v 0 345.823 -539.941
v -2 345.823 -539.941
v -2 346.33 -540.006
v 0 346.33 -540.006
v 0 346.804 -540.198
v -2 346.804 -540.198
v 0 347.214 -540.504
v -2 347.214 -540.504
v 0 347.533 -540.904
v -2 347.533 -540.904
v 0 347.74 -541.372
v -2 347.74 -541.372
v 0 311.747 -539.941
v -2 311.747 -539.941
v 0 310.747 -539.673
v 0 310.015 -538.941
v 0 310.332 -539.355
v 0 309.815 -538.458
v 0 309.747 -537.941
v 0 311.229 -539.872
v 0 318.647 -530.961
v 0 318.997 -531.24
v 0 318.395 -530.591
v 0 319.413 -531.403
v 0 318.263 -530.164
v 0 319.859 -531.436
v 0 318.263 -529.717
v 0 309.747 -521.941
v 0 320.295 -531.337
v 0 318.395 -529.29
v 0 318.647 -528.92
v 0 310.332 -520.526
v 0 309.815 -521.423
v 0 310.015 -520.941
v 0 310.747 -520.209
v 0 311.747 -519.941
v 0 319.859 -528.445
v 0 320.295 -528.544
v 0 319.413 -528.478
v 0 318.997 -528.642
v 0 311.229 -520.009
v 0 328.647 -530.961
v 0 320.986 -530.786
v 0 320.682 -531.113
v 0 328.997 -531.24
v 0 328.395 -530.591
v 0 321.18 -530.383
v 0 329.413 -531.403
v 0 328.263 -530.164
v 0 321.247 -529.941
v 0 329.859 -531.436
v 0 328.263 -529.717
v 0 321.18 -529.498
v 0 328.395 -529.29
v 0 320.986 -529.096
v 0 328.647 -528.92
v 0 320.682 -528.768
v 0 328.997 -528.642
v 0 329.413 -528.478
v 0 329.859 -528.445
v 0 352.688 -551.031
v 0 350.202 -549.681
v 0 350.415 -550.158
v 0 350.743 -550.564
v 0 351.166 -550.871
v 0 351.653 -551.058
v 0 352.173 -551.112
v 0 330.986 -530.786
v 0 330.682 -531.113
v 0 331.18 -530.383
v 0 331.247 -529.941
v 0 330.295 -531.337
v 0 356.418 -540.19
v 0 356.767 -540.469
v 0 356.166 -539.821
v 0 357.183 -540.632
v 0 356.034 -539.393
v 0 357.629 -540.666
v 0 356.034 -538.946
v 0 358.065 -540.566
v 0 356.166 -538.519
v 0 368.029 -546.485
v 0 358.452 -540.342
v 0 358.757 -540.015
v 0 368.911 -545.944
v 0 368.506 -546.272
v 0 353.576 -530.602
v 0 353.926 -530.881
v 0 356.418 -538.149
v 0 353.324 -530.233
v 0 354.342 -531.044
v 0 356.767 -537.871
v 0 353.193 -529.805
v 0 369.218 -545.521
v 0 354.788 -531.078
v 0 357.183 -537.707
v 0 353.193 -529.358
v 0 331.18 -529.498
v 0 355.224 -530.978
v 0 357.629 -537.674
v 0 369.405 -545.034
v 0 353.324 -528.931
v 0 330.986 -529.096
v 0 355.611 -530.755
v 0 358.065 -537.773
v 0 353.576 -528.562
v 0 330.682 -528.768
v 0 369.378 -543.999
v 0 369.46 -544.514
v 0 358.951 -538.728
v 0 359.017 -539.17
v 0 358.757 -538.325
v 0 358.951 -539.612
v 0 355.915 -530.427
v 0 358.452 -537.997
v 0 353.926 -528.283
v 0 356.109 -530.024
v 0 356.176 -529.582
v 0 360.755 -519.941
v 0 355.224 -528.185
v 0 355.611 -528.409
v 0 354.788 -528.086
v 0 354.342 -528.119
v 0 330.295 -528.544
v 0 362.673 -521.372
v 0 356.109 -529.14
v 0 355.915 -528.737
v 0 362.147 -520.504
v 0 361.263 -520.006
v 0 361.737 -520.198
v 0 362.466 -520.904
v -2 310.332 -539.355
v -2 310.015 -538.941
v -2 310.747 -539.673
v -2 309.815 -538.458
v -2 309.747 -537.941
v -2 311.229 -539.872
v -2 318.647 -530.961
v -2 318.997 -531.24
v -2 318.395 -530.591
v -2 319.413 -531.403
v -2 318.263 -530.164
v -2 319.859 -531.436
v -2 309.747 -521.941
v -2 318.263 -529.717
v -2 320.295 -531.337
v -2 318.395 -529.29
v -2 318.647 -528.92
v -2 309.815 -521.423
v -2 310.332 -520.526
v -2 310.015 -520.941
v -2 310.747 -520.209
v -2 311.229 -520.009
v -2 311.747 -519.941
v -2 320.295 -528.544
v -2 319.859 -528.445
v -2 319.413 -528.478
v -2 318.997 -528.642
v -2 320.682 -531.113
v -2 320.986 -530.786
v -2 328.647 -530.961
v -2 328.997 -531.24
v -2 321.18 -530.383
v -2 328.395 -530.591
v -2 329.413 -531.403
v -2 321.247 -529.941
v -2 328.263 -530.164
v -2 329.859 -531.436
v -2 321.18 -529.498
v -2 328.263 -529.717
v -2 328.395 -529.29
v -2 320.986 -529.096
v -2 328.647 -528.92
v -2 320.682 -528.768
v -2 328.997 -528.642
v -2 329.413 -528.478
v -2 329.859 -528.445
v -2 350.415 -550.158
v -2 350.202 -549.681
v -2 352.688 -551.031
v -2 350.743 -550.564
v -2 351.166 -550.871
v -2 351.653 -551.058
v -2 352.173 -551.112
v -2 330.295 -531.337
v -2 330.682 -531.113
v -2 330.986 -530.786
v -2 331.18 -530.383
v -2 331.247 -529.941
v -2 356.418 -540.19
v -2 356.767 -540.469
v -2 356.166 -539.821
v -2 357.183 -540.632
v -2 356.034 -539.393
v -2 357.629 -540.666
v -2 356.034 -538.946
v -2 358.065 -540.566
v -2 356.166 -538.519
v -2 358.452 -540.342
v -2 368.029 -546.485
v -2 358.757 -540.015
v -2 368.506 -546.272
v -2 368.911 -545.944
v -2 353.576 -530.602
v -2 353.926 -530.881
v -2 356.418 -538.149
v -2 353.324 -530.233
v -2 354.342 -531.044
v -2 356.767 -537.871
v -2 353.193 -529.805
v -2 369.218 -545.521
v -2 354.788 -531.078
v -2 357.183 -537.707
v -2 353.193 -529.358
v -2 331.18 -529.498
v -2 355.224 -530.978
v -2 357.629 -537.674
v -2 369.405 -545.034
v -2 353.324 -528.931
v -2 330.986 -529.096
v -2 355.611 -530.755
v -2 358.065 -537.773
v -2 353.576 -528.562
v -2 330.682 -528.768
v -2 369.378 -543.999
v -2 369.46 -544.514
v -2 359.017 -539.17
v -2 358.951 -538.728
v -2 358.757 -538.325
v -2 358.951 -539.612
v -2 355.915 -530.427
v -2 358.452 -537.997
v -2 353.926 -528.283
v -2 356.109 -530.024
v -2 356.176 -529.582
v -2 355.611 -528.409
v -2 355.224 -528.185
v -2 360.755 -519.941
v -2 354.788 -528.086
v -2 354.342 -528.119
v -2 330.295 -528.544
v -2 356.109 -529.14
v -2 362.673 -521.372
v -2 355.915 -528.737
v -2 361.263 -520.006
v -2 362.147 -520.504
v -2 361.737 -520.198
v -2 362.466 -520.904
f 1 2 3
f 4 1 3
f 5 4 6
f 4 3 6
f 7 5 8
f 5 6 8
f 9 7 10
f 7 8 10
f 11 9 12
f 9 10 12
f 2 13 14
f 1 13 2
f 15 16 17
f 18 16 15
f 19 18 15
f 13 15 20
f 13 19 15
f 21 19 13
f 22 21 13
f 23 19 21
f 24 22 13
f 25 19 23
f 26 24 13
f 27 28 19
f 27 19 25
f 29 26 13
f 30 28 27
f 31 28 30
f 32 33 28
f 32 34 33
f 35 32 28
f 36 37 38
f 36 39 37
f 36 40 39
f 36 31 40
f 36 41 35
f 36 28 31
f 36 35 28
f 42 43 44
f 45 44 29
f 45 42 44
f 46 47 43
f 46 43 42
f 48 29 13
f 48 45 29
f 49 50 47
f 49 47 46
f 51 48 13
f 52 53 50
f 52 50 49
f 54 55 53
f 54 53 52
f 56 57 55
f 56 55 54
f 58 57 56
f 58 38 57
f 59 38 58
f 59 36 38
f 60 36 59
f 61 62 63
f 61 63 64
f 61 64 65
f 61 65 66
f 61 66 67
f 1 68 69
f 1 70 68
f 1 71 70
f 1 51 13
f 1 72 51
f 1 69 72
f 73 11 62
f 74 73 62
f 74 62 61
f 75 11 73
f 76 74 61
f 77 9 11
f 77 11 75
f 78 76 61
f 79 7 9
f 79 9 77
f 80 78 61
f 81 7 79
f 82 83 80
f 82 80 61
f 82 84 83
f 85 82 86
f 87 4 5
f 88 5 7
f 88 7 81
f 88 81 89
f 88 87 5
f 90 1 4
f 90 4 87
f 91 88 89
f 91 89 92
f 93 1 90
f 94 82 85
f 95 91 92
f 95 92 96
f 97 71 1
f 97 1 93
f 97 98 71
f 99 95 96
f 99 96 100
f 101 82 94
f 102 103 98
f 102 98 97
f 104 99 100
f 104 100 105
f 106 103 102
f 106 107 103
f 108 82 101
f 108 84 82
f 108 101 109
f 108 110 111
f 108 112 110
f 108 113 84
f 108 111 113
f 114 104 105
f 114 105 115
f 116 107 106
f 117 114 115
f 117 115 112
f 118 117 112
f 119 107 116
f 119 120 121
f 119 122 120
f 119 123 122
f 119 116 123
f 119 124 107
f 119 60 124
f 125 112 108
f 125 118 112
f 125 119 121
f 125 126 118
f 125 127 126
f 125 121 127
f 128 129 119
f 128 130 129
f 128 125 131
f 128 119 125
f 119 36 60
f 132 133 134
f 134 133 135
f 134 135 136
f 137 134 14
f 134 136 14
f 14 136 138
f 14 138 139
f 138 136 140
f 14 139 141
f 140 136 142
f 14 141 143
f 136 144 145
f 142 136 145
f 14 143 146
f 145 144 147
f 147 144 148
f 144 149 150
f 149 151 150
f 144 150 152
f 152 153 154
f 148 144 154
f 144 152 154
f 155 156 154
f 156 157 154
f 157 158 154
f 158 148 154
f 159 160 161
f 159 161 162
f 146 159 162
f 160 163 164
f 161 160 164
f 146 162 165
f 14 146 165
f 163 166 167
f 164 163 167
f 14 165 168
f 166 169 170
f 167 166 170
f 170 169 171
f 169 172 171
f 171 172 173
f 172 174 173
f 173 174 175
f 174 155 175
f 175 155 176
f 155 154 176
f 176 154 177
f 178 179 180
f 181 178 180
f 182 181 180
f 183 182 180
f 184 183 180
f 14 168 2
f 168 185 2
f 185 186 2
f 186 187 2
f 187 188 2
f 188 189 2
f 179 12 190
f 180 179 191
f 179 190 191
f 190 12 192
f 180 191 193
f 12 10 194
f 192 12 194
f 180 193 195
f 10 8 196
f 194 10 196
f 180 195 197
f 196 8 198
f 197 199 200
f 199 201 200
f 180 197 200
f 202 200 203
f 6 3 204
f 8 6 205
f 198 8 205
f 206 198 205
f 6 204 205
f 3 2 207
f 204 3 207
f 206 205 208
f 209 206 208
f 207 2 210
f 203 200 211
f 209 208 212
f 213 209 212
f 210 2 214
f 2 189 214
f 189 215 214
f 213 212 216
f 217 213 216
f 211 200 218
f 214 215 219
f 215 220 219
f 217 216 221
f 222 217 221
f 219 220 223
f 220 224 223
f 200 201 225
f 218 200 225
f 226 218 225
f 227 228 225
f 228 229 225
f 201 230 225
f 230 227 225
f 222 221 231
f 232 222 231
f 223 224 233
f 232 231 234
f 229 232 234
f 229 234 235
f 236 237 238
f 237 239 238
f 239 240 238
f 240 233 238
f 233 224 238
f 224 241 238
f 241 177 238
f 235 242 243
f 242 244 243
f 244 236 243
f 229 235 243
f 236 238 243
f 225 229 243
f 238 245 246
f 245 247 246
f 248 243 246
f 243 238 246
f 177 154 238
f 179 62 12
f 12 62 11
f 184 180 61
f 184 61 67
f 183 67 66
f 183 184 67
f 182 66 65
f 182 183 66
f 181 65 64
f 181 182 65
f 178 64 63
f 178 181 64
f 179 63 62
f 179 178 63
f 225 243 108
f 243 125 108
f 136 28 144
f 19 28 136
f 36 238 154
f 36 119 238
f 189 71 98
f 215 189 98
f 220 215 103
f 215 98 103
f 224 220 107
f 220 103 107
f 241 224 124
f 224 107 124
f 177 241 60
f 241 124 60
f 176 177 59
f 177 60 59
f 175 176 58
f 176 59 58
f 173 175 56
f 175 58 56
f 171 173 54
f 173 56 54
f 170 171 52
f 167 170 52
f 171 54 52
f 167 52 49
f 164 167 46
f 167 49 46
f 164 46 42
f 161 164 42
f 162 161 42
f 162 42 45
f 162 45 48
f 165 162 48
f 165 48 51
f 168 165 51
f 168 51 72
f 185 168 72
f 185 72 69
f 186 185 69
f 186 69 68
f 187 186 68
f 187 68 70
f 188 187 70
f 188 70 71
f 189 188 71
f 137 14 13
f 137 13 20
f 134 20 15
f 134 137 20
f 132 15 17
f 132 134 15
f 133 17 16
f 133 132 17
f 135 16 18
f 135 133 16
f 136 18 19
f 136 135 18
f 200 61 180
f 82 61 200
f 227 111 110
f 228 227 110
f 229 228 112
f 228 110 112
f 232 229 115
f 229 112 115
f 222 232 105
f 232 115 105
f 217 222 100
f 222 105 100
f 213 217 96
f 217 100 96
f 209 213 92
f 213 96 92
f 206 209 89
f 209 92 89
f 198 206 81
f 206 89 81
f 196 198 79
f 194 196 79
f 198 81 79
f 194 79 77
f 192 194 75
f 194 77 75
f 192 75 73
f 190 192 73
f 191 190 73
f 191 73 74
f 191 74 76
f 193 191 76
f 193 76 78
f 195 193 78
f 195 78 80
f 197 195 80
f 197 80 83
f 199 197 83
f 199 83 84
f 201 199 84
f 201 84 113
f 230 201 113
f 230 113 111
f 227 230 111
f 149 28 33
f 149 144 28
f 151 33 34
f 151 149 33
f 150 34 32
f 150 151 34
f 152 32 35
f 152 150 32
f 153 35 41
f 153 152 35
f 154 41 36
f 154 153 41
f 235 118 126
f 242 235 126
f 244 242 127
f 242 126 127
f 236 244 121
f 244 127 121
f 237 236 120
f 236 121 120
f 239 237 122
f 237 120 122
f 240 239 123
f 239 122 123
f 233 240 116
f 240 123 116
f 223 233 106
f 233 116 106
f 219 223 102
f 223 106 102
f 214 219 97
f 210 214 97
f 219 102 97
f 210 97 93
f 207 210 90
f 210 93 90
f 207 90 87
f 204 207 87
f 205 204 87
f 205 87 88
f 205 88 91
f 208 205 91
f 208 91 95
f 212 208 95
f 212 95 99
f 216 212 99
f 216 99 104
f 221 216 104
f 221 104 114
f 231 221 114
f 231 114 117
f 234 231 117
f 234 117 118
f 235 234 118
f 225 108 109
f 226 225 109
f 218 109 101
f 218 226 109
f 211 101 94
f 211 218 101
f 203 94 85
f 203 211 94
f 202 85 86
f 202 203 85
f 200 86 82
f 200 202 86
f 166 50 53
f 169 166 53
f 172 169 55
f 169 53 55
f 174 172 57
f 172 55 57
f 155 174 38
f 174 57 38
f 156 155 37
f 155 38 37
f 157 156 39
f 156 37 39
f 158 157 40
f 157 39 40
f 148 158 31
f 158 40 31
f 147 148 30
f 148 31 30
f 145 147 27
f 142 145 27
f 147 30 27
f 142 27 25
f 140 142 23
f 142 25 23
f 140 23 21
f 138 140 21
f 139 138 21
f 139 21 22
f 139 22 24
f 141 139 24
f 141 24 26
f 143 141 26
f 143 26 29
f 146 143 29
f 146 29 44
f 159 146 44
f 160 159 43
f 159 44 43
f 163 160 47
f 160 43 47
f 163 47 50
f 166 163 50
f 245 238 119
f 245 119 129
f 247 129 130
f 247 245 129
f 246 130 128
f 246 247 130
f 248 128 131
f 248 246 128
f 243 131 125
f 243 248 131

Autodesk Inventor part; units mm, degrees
ref_plane "YZ Plane" through (0, 0, 0) normal (1, 0, 0) x (0, 1, 0)
ref_plane "XZ Plane" through (0, 0, 0) normal (0, 1, 0) x (-1, 0, 0)
ref_plane "XY Plane" through (0, 0, 0) normal (0, 0, 1) x (1, 0, 0)
sketch "スケッチ1" plane through (0, 0, 0) normal (1, 0, 0) x (0, 1, 0)
  line L0 (-65.2534, -641.9406) -> (-65.2534, 666.0594)
  line L1 (-65.2534, -539.9406) -> (339.7466, -539.9406)
  line L2 (339.7466, -539.9406) -> (339.7466, -519.9406)
  line L3 (339.7466, -519.9406) -> (-65.2534, -519.9406)
  line L4 (-65.2534, -519.9406) -> (-65.2534, -539.9406)
  circle A0 centre (-30.0734, -492.9406) radius 21
  circle A1 centre (-30.0734, -450.9406) radius 16
  circle A2 centre (-30.0734, -450.9406) radius 13.68
  line L5 (-85.2534, -641.9406) -> (-65.2534, -641.9406)
  line L6 (-85.2534, -641.9406) -> (-65.2534, -641.9406)
  line L7 (-85.2534, -641.9406) -> (398.7466, -641.9406)
  line L8 (398.7466, -641.9406) -> (398.7466, -661.9406)
  line L9 (398.7466, -661.9406) -> (-85.2534, -661.9406)
  line L10 (-85.2534, -661.9406) -> (-85.2534, -641.9406)
  line L11 (-10.0734, 666.0594) -> (9.1023, 671.742)
  line L12 (9.1023, 671.742) -> (394.9497, -630.2894)
  line L13 (394.9497, -630.2894) -> (375.774, -635.972)
  line L14 (375.774, -635.972) -> (-10.0734, 666.0594)
  line L15 (-85.2534, 666.0594) -> (-85.2534, -641.9406)
  line L16 (-85.2534, -434.9406) -> (-30.0734, -434.9406)
  line L17 (-9.0734, -492.9406) -> (-9.0734, -539.9406)
  line L18 (-9.0734, -492.9406) -> (-9.0734, -434.9406)
  line L19 (-9.0734, -434.9406) -> (-30.0734, -434.9406)
  circle A3 centre (-75.2534, -446.9406) radius 1.5
  circle A4 centre (-75.2534, -456.9406) radius 1.5
  line L20 (-30.0734, -466.9406) -> (-85.2534, -466.9406)
  circle A5 centre (-55.2534, -529.9406) radius 1.5
  circle A6 centre (-35.2534, -529.9406) radius 1.5
  line L21 (-65.2534, -539.9406) -> (-85.2534, -539.9406)
  circle A7 centre (-75.2534, -529.9406) radius 1.5
  circle A8 centre (-75.2534, -509.9406) radius 1.5
  circle A9 centre (-30.0734, 650.0594) radius 16
  line L22 (-65.2534, 666.0594) -> (-85.2534, 666.0594)
  line L23 (-85.2534, 666.0594) -> (-30.0734, 666.0594)
  line L24 (-30.0734, 634.0594) -> (-85.2534, 634.0594)
  line L25 (-30.0734, 666.0594) -> (-10.0734, 666.0594)
  circle A10 centre (-30.0734, 650.0594) radius 7.5
  line L26 (-30.0734, 634.0594) -> (-0.5904, 634.0594)
  circle A11 centre (-75.2534, 654.0594) radius 1.5
  circle A12 centre (-75.2534, 644.0594) radius 1.5
  circle A13 centre (2.3558, 659.3128) radius 1.5
  circle A14 centre (5.1971, 649.725) radius 1.5
  line L27 (-0.5904, 634.0594) -> (18.5853, 639.742)
  line L28 (-65.2534, -601.9406) -> (-45.2534, -641.9406)
  line L29 (-45.2534, -641.9406) -> (-45.2534, -661.9406)
  line L30 (-65.2534, -601.9406) -> (-85.2534, -601.9406)
  circle A15 centre (-75.2534, -631.9406) radius 1.5
  circle A16 centre (-75.2534, -621.9406) radius 1.5
  circle A17 centre (-75.2534, -611.9406) radius 1.5
  circle A18 centre (-75.2534, -651.9406) radius 1.5
  circle A19 centre (-65.2534, -651.9406) radius 1.5
  circle A20 centre (-55.2534, -651.9406) radius 1.5
  line L31 (-85.2534, -641.9406) -> (-85.2534, -601.9406)
  line L32 (368.7466, -641.9406) -> (368.7466, -661.9406)
  line L33 (367.2501, -607.2084) -> (386.4258, -601.5259)
  line L34 (375.774, -635.972) -> (377.5427, -641.9406)
  line L35 (394.9497, -630.2894) -> (398.7466, -641.9406)
  circle A21 centre (378.7466, -651.9406) radius 1.5
  circle A22 centre (388.7466, -651.9406) radius 1.5
  circle A23 centre (382.5205, -623.5429) radius 1.5
  circle A24 centre (379.6792, -613.955) radius 1.5
  circle A25 centre (319.7466, -529.9406) radius 1.5
  circle A26 centre (329.7466, -529.9406) radius 1.5
  line L36 (339.7466, -519.9406) -> (341.3889, -519.9406)
  line L37 (339.7466, -539.9406) -> (347.3158, -539.9406)
  line L38 (341.3889, -519.9406) -> (362.2486, -519.9406)
  circle A27 centre (354.6759, -529.5818) radius 1.5
  circle A28 centre (357.5172, -539.1697) radius 1.5
  line L39 (350.7706, -551.5989) -> (369.9463, -545.9163)
  line L40 (309.7466, -519.9406) -> (309.7466, -539.9406)
  point P0 (0, 0)
  point P1 (-388.2534, -209.6072)
  point P2 (-65.2534, -519.9406)
  point P3 (385.3618, -633.1307)
  dimension "d1" = 42
  dimension "d0" = 20
  dimension "d2" = 32
  dimension "d3" = 27.36
  dimension "d4" = 35.18
  dimension "d5" = 35.18
  dimension "d6" = 27
  dimension "d7" = 42
  dimension "d8" = 191
  dimension "d9" = 20
  dimension "d10" = 484
  dimension "d11" = 3
  dimension "d12" = 3
  dimension "d13" = 10
  dimension "d14" = 10
  dimension "d15" = 10
  dimension "d16" = 10
  dimension "d17" = 3
  dimension "d18" = 3
  dimension "d19" = 10
  dimension "d20" = 20
  dimension "d21" = 10
  dimension "d22" = 10
  dimension "d23" = 3
  dimension "d24" = 3
  dimension "d25" = 10
  dimension "d26" = 20
  dimension "d27" = 10
  dimension "d28" = 10
  dimension "d29" = 20
  dimension "d30" = 32
  dimension "d31" = 35.18
  dimension "d32" = 20
  dimension "d33" = 1358
  dimension "d34" = 91.543
  dimension "d35" = 405
  dimension "d36" = 15
  dimension "d37" = 3
  dimension "d38" = 3
  dimension "d39" = 10
  dimension "d40" = 10
  dimension "d41" = 10
  dimension "d42" = 10
  dimension "d43" = 3
  dimension "d44" = 3
  dimension "d45" = 10
  dimension "d46" = 10
  dimension "d47" = 10
  dimension "d48" = 10
  dimension "d49" = 40
  dimension "d50" = 3
  dimension "d51" = 3
  dimension "d52" = 3
  dimension "d53" = 3
  dimension "d54" = 3
  dimension "d55" = 3
  dimension "d56" = 10
  dimension "d57" = 10
  dimension "d58" = 10
  dimension "d59" = 10
  dimension "d60" = 10
  dimension "d61" = 10
  dimension "d62" = 10
  dimension "d63" = 10
  dimension "d64" = 10
extrude "押し出し1" add sketch "スケッチ1" against normal blind 2 contours L40 L3 L2 L1 | L2 L36 L14 L37 | L14 L38 L12 L39
fillet "フィレット1" radius 2 6 edges at (-1, 309.7466, -519.9406) (-1, 309.7466, -539.9406) (-1, 347.3158, -539.9406) (-1, 350.7706, -551.5989) (-1, 369.9463, -545.9163) (-1, 362.2486, -519.9406)
equation "\"d5\" = d4"
equation "\"d14\" = d15"
equation "\"d21\" = d19"
equation "\"d22\" = d19"
equation "\"d27\" = d25"
equation "\"d28\" = d25"
equation "\"d31\" = d4"
equation "\"d41\" = d39"
equation "\"d42\" = d39"
equation "\"d46\" = d45"
equation "\"d47\" = d45"
equation "\"d48\" = d45"
equation "\"d57\" = d56"
equation "\"d58\" = d56"
equation "\"d59\" = d56"
equation "\"d60\" = d56"
equation "\"d61\" = d56"
equation "\"d62\" = d56"
equation "\"d63\" = d56"
equation "\"d64\" = d62"
properties part number "dribl-v1-Plate-11" material "アルミニウム 6061"
